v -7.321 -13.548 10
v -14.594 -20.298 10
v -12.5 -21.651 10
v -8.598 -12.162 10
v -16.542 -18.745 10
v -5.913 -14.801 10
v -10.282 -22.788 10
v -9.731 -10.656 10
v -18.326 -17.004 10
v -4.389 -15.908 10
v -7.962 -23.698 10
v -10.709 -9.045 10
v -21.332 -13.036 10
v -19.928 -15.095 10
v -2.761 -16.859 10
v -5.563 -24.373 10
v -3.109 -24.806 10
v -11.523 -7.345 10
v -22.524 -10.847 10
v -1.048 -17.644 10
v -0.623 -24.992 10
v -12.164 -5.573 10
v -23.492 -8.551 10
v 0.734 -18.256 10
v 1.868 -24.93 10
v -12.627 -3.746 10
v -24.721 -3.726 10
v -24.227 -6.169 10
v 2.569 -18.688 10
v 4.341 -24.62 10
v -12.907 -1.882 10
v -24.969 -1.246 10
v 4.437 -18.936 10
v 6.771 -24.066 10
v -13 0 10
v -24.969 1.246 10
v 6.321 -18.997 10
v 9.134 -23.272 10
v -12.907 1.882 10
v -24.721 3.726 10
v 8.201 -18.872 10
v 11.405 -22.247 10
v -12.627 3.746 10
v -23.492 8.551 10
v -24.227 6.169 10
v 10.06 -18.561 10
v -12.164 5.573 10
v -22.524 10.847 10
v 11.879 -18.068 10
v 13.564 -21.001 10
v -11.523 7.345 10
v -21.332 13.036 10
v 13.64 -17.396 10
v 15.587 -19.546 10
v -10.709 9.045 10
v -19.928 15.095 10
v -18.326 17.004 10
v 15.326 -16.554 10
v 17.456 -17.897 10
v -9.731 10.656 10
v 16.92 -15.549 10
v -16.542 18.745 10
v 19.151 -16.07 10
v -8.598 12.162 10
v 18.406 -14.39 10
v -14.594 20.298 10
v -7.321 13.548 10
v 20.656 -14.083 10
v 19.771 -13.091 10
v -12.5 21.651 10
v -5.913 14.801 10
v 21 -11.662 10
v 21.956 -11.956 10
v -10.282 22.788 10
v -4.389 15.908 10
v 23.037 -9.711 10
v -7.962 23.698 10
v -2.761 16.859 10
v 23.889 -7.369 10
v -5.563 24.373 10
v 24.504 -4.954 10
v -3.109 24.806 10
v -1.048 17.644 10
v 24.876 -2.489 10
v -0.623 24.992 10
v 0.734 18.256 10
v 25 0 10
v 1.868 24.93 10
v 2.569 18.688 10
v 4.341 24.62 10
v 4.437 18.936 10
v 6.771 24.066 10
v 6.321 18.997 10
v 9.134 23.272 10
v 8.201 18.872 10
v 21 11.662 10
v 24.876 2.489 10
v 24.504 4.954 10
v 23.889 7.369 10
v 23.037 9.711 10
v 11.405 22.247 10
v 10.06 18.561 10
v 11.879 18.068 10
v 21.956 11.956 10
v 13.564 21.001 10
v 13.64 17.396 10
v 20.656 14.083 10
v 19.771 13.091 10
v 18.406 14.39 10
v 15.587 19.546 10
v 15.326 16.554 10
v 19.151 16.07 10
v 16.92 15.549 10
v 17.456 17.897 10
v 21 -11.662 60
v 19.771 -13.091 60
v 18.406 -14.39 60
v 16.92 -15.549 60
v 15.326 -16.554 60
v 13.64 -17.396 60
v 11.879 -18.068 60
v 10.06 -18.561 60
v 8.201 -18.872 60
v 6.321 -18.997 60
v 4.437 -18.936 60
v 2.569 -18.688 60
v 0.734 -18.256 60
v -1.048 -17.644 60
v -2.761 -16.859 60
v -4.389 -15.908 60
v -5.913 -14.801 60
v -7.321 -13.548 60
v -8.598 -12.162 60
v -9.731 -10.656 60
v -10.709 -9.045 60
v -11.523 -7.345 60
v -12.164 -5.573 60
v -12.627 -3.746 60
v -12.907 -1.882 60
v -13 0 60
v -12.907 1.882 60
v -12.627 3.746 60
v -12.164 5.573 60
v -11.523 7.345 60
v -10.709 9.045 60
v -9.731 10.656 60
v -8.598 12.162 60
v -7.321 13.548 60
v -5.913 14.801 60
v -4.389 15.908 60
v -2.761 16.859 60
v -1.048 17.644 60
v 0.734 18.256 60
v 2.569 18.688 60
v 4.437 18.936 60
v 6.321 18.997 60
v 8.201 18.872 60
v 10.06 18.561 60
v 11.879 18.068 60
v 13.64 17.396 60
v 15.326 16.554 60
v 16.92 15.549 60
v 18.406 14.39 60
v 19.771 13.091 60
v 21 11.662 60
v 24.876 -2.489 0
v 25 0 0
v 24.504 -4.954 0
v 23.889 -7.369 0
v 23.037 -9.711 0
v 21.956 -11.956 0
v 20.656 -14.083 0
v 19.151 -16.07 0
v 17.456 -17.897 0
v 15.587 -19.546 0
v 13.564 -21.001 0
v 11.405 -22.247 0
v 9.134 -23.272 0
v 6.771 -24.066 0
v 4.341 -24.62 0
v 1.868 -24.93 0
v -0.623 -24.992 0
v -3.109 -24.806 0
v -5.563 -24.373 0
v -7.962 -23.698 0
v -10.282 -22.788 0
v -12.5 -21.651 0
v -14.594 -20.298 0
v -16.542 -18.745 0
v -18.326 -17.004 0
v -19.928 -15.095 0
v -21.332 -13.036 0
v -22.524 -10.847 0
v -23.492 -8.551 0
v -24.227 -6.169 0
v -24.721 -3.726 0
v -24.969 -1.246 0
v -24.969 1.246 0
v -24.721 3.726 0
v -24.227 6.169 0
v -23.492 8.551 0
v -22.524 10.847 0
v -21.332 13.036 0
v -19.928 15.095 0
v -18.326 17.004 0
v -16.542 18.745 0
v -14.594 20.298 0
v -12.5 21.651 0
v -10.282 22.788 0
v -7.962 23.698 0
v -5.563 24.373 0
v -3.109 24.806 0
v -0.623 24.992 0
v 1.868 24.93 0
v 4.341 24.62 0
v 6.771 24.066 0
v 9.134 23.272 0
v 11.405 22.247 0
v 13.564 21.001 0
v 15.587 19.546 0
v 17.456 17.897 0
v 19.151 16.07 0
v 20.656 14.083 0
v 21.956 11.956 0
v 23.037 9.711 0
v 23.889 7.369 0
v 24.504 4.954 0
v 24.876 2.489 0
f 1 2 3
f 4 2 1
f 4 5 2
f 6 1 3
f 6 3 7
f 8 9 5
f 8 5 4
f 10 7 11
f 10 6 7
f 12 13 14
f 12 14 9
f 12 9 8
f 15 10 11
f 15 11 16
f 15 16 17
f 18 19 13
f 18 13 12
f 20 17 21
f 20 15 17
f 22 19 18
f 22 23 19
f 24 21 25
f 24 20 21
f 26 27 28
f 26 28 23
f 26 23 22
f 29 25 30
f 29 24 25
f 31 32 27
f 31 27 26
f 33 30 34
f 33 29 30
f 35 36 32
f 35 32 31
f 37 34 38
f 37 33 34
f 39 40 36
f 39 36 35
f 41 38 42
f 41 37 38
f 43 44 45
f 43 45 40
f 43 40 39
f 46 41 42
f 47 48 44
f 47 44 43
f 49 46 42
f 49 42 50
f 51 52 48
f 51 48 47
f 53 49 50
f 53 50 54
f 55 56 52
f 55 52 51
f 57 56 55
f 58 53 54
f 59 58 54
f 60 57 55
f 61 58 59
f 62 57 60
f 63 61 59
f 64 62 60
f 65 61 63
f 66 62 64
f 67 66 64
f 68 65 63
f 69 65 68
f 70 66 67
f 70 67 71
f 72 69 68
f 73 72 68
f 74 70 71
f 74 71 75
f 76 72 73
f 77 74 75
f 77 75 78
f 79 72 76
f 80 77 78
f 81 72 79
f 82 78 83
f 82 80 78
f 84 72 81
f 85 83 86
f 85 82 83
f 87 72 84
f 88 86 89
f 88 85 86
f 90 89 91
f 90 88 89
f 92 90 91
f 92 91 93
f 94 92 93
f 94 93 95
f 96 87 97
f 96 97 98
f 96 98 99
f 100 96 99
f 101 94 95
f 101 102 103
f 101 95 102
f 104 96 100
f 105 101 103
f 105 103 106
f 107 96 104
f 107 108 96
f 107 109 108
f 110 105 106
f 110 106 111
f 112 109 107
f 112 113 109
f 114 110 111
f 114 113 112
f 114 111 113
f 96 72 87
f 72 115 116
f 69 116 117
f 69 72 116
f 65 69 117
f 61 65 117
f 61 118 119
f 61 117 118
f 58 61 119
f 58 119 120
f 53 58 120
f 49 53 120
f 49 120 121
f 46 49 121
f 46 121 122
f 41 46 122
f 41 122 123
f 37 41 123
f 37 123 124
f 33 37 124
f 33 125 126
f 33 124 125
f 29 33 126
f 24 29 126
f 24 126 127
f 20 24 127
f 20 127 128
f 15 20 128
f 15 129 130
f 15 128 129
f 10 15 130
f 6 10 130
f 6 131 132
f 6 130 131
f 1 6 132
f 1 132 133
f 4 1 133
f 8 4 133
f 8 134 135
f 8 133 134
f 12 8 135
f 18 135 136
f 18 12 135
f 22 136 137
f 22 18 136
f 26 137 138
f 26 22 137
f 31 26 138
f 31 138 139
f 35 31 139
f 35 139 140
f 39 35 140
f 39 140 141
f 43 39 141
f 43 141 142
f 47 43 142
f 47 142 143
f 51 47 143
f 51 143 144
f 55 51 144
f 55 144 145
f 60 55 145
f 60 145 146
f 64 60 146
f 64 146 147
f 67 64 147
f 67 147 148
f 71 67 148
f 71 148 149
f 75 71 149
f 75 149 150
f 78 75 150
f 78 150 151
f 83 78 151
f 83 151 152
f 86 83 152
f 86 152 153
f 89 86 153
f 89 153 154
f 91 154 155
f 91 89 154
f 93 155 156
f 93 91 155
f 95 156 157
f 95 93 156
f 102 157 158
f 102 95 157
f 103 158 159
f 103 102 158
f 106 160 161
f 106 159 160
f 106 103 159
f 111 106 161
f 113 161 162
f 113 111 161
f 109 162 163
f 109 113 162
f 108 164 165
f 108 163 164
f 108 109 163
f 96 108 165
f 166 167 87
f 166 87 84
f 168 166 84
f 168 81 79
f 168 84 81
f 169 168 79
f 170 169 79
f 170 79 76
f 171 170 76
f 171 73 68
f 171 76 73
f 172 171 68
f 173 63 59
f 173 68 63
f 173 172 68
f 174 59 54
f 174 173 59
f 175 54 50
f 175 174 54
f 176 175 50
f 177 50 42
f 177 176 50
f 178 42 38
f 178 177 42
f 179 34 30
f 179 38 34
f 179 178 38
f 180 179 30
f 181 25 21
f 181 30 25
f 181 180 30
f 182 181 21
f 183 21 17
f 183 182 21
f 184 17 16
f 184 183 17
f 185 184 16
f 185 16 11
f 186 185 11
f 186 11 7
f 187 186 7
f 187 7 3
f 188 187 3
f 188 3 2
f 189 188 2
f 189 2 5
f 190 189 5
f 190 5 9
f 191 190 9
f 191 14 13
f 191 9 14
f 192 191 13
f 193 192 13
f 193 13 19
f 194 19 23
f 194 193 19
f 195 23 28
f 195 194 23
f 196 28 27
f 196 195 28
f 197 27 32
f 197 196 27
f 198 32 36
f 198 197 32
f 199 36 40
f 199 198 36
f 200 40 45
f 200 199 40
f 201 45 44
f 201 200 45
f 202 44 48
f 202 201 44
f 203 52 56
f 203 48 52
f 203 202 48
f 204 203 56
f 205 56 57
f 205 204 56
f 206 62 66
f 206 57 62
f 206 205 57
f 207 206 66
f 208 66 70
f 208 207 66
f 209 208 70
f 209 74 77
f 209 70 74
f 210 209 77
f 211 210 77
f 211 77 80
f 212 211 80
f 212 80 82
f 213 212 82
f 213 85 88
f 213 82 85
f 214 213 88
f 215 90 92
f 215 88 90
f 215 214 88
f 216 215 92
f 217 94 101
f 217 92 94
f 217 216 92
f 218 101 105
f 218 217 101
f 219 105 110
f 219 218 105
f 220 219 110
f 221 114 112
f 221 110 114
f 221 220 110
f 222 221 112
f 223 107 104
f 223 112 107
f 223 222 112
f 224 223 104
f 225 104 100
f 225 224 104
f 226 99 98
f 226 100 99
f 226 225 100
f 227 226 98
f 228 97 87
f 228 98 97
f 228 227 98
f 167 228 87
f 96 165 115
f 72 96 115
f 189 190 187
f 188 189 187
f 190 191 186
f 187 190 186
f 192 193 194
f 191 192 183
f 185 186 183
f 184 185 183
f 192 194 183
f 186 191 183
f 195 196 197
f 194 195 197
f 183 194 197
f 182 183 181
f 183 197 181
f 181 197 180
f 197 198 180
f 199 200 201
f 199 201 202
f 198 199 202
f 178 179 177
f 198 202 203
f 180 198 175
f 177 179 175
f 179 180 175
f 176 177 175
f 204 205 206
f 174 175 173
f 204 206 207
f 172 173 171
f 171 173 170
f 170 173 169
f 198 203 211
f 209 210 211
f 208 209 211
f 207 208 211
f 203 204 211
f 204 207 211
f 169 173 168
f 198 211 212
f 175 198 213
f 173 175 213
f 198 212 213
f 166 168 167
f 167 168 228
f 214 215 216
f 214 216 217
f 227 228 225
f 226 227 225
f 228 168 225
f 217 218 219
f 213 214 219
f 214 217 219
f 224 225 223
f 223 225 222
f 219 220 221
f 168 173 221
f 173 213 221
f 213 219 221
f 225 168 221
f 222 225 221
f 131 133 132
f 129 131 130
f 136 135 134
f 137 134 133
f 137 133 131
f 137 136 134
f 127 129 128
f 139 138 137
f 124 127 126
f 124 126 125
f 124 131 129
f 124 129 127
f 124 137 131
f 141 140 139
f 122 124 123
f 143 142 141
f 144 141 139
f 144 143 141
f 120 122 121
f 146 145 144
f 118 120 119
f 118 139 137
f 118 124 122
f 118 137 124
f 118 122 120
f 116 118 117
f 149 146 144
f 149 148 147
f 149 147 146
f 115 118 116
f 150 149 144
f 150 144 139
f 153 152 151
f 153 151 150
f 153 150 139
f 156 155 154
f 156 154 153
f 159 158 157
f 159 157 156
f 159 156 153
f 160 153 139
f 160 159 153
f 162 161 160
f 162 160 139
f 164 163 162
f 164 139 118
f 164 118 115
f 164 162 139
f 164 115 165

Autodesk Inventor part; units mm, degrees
ref_plane "YZ Plane" through (0, 0, 0) normal (1, 0, 0) x (0, 1, 0)
ref_plane "XZ Plane" through (0, 0, 0) normal (0, 1, 0) x (-1, 0, 0)
ref_plane "XY Plane" through (0, 0, 0) normal (0, 0, 1) x (1, 0, 0)
sketch "草圖1" plane through (0, 0, 0) normal (0, 0, 1) x (1, 0, 0)
  circle A0 centre (0, 0) radius 25
  dimension "d0" = 50
extrude "擠出1" add sketch "草圖1" along normal blind 10
sketch "草圖2" plane through (0, 0, 10) normal (0, 0, 1) x (1, 0, 0)
  circle A0 centre (6, 0) radius 19
  circle A1 centre (0, 0) radius 25 projected
  dimension "d3" = 6
extrude "擠出2" add sketch "草圖2" along normal blind 50 contours A0
sketch "草圖3" plane through (6, 0, 60) normal (0, 0, 1) x (1, 0, 0)
  circle A0 centre (0, 0) radius 19 projected
  circle A1 centre (0, 0) radius 19 projected
  line L0 (15, 11.6619) -> (15, -11.6619)
  point P0 (-6, 0)
  point P1 (19, 0)
  point P2 (15, 11.6619)
  point P3 (15, -11.6619)
  dimension "d6" = 15
extrude "擠出3" cut sketch "草圖3" against normal up to surface (50 mm away) contours A0 L0 picked at (16.3333, 0)
properties part number "input"
